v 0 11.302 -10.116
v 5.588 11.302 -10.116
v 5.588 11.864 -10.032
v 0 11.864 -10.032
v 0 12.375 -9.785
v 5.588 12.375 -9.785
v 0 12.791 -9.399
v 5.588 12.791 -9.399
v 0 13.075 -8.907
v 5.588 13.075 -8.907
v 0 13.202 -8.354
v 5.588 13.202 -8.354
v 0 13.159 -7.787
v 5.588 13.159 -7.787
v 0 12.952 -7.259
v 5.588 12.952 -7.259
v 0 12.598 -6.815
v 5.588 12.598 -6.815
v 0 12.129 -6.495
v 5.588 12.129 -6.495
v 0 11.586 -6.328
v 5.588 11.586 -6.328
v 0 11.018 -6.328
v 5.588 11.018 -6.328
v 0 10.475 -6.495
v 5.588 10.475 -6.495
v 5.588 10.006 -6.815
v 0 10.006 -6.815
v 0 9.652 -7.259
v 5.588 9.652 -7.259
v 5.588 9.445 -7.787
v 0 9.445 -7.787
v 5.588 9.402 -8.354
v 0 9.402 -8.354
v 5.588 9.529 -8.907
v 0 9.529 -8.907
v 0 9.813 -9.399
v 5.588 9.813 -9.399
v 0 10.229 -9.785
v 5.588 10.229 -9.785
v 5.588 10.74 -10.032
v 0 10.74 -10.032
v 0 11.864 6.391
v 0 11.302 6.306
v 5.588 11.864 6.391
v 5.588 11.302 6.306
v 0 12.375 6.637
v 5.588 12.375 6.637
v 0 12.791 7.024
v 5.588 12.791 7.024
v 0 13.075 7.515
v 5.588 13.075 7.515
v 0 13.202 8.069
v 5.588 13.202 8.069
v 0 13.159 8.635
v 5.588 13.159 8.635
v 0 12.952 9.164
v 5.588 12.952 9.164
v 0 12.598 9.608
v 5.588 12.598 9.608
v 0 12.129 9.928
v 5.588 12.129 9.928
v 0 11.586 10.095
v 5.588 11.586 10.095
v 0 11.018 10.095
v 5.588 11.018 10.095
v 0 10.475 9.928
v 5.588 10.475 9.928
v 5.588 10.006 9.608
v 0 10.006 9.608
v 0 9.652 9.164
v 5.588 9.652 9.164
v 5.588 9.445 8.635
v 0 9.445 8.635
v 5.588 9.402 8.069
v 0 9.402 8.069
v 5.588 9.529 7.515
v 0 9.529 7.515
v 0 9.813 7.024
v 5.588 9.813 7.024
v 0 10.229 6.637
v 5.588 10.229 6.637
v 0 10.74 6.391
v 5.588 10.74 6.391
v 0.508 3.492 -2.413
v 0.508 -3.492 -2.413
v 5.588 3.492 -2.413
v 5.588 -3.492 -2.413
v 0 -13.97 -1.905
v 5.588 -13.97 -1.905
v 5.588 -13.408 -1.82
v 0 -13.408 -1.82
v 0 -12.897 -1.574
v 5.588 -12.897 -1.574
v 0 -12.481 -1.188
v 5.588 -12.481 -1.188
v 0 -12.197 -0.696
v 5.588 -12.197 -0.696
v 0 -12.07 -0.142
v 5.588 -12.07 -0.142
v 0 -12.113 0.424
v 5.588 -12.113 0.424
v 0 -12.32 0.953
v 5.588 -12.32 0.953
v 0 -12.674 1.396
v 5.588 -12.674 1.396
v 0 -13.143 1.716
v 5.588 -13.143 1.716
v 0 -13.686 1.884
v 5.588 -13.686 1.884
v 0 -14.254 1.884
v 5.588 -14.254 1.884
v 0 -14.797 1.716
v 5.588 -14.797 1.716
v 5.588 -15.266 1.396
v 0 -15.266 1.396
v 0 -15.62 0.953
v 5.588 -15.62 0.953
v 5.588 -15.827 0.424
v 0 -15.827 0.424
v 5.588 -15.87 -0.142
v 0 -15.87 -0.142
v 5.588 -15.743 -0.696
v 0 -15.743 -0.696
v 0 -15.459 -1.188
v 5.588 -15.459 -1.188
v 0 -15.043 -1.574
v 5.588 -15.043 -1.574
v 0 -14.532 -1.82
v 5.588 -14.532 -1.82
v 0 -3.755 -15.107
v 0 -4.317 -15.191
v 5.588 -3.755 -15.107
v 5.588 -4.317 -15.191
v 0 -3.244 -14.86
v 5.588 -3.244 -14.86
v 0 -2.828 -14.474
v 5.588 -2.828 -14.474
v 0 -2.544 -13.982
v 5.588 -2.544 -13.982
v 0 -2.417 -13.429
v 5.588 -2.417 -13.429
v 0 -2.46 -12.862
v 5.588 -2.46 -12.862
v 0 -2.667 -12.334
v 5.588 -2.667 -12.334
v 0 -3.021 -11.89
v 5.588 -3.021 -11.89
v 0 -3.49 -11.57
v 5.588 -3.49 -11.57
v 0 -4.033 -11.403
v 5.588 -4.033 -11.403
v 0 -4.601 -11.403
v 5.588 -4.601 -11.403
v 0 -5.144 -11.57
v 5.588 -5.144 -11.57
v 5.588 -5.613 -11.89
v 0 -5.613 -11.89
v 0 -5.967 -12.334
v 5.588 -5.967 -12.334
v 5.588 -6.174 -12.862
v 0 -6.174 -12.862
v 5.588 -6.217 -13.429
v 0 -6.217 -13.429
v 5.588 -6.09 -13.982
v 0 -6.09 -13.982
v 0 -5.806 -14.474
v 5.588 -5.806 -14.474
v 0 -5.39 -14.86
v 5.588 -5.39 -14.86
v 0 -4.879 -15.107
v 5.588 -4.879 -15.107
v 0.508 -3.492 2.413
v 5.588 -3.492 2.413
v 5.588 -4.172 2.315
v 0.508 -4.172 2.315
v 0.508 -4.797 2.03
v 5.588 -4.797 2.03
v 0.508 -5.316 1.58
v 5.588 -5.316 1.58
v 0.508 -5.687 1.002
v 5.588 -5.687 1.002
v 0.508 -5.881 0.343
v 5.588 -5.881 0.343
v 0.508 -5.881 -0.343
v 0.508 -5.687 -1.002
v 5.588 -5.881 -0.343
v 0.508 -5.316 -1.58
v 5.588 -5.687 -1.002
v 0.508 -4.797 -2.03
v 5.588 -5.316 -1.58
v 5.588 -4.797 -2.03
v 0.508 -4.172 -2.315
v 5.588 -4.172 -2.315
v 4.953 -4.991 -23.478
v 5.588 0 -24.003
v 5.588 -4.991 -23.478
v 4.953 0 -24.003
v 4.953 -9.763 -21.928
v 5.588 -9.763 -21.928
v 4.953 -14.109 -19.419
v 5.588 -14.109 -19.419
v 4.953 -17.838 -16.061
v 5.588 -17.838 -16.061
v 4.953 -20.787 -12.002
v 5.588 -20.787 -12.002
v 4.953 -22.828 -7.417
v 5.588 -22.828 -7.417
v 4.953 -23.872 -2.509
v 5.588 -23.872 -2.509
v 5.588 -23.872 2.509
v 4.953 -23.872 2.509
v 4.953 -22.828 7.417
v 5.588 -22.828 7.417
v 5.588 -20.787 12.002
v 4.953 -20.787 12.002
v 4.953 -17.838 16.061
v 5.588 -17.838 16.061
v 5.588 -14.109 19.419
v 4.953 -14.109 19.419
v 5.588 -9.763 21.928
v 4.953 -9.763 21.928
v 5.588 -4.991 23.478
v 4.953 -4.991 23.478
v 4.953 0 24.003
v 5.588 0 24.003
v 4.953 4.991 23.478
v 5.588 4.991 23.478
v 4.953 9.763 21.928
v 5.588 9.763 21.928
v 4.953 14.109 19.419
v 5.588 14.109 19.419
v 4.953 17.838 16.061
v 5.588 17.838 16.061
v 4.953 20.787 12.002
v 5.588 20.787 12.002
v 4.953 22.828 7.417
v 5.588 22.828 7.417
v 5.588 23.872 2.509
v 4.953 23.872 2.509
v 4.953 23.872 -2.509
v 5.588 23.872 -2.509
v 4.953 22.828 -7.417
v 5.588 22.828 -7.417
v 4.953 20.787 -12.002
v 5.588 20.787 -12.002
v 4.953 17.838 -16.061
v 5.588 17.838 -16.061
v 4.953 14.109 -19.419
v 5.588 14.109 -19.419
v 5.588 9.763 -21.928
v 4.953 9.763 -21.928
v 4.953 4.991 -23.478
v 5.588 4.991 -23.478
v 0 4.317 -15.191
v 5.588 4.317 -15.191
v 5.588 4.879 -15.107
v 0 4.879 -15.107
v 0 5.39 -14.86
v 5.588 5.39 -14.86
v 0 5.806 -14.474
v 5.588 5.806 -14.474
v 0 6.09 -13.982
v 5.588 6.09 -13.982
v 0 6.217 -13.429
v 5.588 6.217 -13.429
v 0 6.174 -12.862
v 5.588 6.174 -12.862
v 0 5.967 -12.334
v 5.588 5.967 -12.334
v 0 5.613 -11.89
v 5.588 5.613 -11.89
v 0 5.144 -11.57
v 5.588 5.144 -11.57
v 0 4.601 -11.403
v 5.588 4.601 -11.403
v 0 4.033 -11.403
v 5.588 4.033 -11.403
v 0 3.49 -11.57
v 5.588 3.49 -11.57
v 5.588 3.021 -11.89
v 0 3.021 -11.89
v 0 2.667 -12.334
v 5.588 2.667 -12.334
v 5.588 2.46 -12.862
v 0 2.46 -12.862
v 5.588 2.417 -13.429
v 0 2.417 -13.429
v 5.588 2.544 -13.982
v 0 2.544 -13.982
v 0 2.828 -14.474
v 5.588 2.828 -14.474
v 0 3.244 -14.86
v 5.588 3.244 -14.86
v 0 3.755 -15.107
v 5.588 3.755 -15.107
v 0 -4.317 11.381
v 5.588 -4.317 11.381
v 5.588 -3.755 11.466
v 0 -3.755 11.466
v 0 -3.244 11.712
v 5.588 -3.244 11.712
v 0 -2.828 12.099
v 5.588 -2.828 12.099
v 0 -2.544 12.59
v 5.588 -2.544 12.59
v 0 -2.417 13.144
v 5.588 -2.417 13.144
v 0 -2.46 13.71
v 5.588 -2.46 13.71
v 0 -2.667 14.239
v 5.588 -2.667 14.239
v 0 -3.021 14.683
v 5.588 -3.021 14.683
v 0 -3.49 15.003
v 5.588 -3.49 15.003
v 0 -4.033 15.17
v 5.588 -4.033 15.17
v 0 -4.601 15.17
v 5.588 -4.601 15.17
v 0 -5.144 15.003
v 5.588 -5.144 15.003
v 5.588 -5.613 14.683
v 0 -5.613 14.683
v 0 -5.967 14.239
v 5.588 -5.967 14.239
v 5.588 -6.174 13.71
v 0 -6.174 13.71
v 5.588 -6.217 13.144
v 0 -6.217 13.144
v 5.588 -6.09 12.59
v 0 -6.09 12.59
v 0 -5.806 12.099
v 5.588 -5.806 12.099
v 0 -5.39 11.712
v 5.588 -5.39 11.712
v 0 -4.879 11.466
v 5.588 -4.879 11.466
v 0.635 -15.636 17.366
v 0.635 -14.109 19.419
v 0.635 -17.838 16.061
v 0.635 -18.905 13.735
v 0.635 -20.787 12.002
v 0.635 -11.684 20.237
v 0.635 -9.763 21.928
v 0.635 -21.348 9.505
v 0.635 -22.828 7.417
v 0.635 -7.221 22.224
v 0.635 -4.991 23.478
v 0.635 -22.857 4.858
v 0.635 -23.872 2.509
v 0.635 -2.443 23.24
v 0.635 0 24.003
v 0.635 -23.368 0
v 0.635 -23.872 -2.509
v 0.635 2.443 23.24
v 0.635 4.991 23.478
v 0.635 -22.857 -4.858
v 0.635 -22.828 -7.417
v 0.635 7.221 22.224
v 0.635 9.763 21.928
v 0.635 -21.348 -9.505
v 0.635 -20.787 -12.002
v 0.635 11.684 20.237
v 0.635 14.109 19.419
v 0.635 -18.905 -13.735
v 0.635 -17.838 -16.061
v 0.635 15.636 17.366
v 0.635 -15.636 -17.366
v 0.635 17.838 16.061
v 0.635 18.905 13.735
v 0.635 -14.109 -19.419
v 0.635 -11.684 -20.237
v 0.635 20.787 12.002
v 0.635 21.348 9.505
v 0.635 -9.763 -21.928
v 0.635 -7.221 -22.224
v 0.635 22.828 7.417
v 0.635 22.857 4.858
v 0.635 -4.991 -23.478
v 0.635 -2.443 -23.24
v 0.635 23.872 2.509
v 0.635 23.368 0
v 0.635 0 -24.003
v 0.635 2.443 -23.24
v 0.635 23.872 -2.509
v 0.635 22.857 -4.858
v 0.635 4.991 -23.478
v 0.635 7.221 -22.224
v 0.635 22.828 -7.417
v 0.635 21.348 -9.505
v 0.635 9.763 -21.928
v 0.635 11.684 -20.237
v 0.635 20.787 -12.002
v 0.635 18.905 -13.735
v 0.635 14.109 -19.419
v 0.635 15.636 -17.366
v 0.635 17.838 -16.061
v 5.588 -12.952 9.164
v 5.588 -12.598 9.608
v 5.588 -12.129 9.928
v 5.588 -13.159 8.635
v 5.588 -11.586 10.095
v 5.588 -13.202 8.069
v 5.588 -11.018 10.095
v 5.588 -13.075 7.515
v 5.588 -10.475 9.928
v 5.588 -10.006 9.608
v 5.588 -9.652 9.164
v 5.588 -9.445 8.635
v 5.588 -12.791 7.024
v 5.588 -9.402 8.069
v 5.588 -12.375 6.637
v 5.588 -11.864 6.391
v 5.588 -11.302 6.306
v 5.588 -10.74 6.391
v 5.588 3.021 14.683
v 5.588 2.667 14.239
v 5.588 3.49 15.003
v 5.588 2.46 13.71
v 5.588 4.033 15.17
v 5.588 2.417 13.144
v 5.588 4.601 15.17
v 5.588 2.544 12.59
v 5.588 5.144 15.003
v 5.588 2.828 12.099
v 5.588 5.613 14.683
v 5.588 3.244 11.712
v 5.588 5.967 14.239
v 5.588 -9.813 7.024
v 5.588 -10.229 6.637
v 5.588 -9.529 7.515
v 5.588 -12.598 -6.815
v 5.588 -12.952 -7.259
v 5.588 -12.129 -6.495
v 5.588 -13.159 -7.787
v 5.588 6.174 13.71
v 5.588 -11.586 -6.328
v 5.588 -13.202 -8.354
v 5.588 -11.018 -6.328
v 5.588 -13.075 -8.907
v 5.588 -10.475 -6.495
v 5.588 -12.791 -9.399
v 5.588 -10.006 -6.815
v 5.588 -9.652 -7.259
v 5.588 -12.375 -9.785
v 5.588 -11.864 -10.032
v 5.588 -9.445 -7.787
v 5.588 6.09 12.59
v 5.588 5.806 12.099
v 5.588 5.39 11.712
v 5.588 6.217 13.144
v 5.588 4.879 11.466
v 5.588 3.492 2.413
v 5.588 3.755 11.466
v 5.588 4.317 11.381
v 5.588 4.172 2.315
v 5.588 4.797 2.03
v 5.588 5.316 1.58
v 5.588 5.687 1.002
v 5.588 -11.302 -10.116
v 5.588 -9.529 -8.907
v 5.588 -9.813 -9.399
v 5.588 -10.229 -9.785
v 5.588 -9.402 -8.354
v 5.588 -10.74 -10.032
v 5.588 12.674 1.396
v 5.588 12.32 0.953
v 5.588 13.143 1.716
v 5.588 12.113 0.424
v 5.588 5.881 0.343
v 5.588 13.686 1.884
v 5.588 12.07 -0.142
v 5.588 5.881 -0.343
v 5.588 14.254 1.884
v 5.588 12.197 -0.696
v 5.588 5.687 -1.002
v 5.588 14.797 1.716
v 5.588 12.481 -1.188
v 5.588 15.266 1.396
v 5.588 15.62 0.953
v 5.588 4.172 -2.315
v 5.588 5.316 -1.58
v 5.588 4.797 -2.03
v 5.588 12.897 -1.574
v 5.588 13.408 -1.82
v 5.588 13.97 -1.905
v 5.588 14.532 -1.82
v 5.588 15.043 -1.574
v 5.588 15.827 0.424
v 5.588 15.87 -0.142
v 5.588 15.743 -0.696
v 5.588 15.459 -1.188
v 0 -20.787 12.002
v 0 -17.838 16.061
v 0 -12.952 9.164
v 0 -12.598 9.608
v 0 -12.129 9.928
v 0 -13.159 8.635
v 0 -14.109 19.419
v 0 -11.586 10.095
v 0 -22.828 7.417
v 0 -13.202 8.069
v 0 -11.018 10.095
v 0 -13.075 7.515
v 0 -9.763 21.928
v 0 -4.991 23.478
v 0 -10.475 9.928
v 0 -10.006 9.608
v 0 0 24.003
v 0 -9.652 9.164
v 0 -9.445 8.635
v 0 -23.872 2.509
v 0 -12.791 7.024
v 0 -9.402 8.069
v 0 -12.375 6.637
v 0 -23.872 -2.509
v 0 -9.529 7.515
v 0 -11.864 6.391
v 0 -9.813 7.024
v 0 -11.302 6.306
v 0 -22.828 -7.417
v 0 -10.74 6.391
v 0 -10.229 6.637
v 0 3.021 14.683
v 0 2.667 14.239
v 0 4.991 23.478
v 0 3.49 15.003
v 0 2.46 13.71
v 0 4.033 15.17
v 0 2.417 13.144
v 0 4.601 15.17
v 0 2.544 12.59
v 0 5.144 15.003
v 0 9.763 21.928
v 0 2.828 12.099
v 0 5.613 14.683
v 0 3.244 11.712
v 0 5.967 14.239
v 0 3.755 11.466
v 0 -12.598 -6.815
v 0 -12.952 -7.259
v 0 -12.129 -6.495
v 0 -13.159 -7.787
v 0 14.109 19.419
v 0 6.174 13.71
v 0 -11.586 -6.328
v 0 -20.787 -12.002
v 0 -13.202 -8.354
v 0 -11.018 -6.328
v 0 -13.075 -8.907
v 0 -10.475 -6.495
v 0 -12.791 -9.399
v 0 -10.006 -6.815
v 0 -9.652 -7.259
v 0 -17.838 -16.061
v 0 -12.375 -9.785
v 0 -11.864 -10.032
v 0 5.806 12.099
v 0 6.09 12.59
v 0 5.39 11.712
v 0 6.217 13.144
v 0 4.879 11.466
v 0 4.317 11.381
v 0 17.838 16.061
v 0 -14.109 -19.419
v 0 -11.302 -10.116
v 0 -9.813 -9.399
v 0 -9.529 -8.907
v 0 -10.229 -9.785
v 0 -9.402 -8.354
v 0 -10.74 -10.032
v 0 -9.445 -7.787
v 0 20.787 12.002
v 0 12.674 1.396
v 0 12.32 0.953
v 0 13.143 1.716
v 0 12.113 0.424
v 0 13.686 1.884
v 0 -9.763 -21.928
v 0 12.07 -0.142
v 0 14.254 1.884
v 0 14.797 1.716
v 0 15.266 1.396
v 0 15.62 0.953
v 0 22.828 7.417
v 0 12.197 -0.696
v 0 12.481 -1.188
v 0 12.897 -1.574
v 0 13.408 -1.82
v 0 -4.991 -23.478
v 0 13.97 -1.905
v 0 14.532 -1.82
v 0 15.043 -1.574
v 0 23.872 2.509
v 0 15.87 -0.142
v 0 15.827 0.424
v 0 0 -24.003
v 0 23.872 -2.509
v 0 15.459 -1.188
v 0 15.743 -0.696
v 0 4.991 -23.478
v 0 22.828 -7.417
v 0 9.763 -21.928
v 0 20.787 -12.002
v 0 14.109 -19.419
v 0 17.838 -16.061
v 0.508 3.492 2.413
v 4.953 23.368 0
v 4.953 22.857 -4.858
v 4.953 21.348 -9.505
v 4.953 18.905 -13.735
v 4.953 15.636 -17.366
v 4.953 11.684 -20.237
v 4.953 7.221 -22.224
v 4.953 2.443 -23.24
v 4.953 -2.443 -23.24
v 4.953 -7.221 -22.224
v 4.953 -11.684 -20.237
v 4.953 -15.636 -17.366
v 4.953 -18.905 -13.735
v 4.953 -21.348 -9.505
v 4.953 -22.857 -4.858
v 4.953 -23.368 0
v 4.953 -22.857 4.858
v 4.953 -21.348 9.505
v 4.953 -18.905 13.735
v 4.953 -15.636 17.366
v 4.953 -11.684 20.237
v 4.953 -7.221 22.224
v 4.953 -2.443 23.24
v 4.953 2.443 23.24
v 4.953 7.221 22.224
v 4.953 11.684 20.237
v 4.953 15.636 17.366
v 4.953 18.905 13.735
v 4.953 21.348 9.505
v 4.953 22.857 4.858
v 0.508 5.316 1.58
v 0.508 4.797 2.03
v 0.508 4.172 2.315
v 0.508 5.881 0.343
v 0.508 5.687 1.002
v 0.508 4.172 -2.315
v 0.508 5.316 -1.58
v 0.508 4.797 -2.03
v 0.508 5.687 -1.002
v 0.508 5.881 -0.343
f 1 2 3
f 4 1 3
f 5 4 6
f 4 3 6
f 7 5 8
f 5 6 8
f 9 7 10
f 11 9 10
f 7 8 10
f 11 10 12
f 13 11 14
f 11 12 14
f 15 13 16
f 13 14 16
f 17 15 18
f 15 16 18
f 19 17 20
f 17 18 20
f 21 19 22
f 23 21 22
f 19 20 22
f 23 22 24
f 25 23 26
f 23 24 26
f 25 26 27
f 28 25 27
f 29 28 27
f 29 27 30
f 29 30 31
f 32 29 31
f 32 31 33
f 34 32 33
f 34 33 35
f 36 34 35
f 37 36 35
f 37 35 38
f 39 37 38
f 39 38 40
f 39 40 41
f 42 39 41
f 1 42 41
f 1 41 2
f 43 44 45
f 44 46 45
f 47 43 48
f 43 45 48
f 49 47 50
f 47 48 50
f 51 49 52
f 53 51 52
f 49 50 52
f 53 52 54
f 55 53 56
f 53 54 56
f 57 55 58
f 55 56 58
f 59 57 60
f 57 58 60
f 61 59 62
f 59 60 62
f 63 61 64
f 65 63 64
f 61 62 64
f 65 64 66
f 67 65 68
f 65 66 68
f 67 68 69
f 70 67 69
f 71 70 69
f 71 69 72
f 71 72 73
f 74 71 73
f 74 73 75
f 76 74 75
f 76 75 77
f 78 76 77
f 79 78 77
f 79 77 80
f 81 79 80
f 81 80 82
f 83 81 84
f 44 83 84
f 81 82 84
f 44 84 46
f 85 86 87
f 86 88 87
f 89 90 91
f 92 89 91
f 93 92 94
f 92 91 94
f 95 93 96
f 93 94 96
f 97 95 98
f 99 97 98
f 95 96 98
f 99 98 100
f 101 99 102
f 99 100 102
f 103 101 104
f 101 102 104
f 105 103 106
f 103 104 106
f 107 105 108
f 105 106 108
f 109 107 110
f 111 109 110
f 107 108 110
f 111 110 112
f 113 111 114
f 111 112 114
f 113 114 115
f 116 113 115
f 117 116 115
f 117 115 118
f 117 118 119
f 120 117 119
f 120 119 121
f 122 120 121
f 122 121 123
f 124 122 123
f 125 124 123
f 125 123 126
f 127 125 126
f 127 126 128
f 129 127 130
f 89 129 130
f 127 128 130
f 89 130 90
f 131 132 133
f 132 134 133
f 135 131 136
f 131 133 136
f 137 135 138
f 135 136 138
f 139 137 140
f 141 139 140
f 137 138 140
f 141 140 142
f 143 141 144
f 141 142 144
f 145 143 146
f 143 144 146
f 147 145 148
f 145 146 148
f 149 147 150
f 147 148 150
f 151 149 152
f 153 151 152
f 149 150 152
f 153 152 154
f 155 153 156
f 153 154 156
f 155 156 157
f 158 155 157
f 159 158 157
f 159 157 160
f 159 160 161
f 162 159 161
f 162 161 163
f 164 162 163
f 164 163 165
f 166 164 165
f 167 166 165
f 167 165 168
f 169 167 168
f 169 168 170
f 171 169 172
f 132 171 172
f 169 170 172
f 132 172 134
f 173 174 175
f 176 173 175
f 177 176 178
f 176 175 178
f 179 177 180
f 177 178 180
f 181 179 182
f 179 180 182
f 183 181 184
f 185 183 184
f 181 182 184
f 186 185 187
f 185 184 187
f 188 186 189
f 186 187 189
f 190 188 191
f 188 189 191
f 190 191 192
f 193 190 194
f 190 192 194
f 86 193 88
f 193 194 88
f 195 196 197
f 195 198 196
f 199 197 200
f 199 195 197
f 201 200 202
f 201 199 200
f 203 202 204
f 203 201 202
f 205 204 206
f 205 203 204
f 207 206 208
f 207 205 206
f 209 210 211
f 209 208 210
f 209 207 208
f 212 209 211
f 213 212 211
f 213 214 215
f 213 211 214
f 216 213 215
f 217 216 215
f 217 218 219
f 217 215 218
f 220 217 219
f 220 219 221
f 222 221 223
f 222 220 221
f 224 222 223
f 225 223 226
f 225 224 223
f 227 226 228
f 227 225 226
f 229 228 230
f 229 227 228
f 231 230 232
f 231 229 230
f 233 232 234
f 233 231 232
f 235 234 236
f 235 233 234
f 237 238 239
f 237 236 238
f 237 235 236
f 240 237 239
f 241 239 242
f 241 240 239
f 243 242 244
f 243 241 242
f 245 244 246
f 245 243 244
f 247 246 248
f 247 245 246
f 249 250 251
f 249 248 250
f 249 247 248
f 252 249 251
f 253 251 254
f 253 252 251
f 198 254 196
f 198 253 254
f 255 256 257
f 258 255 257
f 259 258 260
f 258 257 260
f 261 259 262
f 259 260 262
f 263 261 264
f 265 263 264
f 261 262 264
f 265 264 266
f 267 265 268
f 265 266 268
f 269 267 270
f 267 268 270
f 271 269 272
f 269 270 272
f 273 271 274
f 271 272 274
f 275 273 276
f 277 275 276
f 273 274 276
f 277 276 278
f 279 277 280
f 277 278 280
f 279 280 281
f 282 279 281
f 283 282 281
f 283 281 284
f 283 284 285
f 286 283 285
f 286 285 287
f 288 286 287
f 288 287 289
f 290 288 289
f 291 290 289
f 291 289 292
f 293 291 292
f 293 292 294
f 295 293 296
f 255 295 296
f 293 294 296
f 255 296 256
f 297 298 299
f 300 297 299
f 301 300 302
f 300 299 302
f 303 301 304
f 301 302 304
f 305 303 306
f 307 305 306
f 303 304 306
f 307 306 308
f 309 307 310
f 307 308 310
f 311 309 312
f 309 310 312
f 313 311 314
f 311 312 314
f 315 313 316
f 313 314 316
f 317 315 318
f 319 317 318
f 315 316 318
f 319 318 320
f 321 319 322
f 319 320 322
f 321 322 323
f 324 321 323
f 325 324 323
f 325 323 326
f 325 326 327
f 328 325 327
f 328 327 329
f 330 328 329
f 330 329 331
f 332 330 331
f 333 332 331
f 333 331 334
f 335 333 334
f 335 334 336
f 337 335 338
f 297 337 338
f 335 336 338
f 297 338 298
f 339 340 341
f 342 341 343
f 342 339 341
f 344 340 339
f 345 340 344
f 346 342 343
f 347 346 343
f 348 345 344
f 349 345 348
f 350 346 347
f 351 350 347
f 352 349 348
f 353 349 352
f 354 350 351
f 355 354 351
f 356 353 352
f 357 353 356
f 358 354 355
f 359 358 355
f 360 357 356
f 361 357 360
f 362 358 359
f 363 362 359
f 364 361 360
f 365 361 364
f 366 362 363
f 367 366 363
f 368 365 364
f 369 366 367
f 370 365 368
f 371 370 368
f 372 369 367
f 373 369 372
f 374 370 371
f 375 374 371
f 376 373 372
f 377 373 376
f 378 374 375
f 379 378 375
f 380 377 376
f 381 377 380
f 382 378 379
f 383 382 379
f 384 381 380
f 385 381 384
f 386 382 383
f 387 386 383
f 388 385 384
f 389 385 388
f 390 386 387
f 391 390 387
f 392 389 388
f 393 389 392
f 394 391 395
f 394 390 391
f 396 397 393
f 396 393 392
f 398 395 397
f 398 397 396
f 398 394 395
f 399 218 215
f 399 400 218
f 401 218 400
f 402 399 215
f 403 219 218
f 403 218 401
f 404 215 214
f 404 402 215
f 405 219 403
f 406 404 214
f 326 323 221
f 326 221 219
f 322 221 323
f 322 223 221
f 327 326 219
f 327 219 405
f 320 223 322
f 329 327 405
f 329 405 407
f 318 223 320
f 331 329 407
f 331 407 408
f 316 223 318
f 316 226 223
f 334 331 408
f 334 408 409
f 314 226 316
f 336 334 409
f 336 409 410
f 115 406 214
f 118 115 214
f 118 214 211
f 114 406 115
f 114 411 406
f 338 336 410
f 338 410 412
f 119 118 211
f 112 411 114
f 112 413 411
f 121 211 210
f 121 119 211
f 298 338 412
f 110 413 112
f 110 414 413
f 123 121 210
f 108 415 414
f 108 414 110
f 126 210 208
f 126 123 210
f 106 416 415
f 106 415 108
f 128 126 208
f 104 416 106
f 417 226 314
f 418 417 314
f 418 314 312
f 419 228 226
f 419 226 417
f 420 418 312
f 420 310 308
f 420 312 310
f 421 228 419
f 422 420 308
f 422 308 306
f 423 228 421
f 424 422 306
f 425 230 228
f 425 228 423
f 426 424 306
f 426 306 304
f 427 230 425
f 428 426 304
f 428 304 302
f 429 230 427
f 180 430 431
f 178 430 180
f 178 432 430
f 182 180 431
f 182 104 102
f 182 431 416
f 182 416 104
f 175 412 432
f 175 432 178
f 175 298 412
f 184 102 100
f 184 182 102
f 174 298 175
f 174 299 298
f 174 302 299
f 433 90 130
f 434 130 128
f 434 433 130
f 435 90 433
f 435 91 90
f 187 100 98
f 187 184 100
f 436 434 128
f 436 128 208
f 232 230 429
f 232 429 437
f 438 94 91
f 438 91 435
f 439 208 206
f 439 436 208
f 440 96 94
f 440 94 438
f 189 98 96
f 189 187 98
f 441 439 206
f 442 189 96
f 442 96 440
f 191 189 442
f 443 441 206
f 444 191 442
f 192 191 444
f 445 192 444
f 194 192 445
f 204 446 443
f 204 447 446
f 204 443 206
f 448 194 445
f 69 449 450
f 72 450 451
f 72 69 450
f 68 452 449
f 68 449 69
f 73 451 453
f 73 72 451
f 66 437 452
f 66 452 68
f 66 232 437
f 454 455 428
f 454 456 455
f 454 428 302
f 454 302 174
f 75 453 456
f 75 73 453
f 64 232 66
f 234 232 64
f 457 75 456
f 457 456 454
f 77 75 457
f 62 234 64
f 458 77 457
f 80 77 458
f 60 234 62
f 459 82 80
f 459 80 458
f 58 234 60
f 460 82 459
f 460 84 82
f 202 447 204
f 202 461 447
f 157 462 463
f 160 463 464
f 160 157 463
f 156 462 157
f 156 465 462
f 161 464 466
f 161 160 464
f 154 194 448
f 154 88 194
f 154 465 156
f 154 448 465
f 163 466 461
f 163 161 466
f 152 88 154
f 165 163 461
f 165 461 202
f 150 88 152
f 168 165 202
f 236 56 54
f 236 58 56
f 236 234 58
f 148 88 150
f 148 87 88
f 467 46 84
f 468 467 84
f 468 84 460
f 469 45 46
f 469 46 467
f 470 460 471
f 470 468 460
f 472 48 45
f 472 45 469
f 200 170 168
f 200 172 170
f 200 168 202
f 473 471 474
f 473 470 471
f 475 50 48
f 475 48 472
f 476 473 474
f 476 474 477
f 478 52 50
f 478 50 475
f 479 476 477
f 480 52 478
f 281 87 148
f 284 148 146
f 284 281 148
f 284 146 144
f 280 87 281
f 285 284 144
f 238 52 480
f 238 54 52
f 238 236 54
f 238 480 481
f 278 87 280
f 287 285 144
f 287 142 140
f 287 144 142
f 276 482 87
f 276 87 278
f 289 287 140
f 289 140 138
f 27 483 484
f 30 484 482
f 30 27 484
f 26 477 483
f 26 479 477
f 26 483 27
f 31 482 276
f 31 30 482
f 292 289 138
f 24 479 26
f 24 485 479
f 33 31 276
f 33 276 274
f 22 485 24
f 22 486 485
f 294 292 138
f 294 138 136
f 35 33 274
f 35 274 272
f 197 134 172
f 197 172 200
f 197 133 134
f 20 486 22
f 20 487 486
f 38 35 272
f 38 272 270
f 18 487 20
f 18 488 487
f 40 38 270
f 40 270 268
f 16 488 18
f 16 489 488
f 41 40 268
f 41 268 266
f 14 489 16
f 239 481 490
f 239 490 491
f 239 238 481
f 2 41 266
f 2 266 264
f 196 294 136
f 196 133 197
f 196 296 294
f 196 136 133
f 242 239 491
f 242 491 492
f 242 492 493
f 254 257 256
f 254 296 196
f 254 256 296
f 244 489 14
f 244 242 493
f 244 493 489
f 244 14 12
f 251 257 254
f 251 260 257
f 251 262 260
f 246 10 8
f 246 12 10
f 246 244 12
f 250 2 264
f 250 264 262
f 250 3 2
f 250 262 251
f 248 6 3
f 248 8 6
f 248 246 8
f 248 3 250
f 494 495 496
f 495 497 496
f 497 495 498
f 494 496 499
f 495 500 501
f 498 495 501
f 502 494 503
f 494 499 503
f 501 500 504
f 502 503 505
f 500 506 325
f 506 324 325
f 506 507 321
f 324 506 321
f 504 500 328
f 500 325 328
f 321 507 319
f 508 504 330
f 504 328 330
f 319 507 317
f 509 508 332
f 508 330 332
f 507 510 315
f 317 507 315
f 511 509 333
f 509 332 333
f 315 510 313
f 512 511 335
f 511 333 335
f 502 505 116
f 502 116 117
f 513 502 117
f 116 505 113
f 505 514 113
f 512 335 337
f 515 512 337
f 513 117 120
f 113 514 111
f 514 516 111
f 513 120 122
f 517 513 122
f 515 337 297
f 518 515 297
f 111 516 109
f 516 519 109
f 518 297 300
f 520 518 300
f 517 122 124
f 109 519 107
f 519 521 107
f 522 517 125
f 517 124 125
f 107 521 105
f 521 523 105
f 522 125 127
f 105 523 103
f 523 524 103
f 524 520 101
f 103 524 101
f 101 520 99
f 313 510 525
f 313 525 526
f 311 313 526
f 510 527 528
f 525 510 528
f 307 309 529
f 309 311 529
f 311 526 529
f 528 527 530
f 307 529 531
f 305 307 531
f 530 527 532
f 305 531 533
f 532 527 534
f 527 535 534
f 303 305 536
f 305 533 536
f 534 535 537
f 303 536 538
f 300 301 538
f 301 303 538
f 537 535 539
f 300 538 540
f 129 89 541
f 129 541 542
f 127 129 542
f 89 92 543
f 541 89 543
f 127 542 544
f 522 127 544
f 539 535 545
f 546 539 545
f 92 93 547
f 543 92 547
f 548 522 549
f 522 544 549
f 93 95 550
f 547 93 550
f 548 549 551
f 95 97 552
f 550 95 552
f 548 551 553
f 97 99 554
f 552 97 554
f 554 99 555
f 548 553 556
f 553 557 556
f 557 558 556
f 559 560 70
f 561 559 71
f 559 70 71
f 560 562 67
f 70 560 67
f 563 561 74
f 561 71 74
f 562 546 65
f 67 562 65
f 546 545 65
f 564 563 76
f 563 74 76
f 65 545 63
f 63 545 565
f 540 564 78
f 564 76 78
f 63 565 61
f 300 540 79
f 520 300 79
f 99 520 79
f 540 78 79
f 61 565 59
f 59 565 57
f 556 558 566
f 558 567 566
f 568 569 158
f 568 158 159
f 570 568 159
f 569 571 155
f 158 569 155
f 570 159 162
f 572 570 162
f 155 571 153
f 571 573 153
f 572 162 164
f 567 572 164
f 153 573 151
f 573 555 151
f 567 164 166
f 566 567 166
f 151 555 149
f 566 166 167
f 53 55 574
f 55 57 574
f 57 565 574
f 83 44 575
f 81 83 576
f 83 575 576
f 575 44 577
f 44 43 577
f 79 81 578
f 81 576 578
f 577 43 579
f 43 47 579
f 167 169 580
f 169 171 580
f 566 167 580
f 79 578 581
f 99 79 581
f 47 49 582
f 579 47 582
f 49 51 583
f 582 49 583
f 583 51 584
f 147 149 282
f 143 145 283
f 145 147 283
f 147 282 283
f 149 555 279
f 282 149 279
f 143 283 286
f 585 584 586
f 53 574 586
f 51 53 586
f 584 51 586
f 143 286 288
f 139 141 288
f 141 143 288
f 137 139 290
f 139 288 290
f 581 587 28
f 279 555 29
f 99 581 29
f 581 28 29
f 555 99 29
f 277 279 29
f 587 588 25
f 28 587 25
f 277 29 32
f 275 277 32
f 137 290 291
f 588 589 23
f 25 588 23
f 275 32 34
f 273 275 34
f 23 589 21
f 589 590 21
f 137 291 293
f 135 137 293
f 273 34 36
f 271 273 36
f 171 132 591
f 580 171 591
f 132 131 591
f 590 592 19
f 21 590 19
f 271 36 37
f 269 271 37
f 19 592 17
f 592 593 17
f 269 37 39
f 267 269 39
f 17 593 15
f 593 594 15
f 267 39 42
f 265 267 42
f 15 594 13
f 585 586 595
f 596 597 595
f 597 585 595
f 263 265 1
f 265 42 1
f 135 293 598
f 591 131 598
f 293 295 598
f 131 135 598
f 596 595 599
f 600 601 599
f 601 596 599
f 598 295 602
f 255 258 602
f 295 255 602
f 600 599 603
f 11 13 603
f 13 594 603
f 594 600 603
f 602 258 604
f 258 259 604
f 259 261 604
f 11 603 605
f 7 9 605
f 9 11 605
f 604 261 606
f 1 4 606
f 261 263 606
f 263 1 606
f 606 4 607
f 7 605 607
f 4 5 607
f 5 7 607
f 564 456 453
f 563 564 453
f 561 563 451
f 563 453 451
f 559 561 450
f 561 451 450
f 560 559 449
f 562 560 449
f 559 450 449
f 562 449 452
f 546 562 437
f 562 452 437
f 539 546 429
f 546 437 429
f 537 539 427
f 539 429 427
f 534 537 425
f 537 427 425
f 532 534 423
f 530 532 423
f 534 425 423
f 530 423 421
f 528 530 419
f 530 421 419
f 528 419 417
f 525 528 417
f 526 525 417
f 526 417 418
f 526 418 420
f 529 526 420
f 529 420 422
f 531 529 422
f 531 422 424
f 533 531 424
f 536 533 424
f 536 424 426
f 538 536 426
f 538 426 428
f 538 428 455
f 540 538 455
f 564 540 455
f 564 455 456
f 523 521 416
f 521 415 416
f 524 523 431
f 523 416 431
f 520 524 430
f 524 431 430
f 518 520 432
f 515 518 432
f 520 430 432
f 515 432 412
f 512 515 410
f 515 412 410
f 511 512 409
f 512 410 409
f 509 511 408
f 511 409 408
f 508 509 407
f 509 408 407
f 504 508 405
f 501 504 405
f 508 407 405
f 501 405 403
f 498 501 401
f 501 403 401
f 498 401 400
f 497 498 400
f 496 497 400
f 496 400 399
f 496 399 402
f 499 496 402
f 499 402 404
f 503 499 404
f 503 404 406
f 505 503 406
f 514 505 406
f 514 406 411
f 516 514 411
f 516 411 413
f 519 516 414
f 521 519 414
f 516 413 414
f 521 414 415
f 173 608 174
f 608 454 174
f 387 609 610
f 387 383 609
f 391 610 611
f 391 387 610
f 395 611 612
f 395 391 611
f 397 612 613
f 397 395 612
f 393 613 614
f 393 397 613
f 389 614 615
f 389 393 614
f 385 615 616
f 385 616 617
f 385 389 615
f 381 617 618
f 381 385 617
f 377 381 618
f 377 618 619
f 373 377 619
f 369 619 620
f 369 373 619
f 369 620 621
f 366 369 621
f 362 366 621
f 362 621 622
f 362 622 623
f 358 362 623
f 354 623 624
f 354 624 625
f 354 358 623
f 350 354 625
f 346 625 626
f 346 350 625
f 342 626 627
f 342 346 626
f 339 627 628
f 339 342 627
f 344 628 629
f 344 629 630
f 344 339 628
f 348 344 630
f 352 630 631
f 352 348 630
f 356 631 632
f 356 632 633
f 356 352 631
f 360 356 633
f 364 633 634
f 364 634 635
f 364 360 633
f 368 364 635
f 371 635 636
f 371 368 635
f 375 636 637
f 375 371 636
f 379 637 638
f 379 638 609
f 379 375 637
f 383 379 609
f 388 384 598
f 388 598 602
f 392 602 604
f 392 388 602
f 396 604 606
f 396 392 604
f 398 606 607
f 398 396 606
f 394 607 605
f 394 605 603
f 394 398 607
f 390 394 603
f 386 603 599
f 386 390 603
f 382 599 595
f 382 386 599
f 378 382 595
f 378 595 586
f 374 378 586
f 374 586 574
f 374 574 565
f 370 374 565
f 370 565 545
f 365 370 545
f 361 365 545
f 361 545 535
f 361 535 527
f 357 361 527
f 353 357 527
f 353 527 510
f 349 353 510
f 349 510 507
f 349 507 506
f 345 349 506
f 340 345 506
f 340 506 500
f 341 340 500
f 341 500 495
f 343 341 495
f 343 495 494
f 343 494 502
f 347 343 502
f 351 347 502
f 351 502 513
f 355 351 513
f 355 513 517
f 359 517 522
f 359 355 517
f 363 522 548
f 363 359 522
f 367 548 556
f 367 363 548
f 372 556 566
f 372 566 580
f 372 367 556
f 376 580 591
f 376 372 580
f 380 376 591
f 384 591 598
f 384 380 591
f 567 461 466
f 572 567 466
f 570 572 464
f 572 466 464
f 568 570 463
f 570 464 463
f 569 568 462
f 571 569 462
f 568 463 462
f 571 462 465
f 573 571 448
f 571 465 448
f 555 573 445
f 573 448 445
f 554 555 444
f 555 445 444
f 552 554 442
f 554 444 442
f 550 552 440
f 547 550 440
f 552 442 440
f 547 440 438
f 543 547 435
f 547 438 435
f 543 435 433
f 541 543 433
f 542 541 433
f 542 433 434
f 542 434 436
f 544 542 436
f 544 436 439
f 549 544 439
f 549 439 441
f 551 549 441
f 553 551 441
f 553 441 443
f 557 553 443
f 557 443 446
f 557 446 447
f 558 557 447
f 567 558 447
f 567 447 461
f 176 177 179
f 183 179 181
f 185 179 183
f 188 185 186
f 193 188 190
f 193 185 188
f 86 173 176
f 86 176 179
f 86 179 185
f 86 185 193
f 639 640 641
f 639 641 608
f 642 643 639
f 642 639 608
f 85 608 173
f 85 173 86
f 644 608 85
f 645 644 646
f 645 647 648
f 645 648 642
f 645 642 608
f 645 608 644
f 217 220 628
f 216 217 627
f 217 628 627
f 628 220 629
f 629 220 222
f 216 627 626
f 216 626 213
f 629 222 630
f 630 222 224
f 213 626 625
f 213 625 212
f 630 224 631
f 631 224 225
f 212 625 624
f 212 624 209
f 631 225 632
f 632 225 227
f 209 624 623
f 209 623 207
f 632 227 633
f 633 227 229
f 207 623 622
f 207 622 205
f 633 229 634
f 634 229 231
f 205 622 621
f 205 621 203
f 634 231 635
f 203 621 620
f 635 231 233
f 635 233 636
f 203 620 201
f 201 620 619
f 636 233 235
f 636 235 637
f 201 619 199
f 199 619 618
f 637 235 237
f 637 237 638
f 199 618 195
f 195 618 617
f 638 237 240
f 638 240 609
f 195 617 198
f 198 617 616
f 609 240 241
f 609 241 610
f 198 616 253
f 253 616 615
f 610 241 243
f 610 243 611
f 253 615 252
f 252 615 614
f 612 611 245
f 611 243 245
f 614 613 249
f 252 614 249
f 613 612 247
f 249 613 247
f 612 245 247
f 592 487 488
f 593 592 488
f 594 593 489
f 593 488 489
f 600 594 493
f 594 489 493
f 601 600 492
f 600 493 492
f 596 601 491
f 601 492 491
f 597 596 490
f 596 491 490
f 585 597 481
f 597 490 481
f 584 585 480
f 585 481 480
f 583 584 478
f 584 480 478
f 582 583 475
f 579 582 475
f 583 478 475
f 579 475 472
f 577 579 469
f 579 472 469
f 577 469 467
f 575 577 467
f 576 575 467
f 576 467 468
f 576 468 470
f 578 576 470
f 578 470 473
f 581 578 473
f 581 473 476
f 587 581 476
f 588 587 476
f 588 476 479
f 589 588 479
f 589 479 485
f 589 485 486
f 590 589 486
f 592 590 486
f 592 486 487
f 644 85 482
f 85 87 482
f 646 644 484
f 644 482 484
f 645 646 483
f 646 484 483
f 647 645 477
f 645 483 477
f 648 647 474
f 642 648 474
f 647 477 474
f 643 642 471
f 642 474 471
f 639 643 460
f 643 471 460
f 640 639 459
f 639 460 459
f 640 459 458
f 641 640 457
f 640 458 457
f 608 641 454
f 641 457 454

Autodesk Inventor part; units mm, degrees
sketch "Sketch1" plane through (0, 0, 0) normal (1, 0, 0) x (0, 1, 0)
  circle A0 centre (0, 0) radius 23.368
  dimension "d0" = 46.736
extrude "Extrusion1" add sketch "Sketch1" along normal blind 5.588
ref_plane "Work Plane2" through (5.588, 0, 0) normal (1, 0, 0) x (0, 0, -1)
sketch "Sketch3" plane through (5.588, 0, 0) normal (1, 0, 0) x (0, 0, -1)
  line L0 (0, -3.4925) -> (0, 3.4925) construction
  line L1 (2.413, -3.4925) -> (2.413, 3.4925)
  line L2 (-2.413, 3.4925) -> (-2.413, -3.4925)
  arc A0 (-2.413, -3.4925) -> (2.413, -3.4925) centre (0, -3.4925) ccw
  arc A1 (2.413, 3.4925) -> (-2.413, 3.4925) centre (0, 3.4925) ccw
  point P0 (0, 0)
  dimension "d8" = 3.4925
  dimension "d9" = 4.826
extrude "Extrusion2" cut sketch "Sketch3" against normal blind 5.08
ref_plane "Work Plane3" through (5.588, 0, 0) normal (1, 0, 0) x (0, 0, -1)
sketch "Sketch6" plane through (5.588, 0, 0) normal (1, 0, 0) x (0, 0, -1)
  line L0 (0, 0) -> (0, 13.97)
  circle A0 centre (0, 13.97) radius 1.905
  circle A1 centre (-8.2114, 11.302) radius 1.905
  circle A2 centre (-13.2863, 4.317) radius 1.905
  circle A3 centre (-13.2863, -4.317) radius 1.905
  circle A4 centre (-8.2114, -11.302) radius 1.905
  circle A5 centre (0, -13.97) radius 1.905
  circle A6 centre (8.2114, -11.302) radius 1.905
  circle A7 centre (13.2863, -4.317) radius 1.905
  circle A8 centre (13.2863, 4.317) radius 1.905
  circle A9 centre (8.2114, 11.302) radius 1.905
  dimension "d16" = 13.97
  dimension "d17" = 3.81
  dimension "d20" = 360
extrude "Extrusion3" cut sketch "Sketch6" against normal blind 25.4
ref_plane "Work Plane1" through (5.588, 0, 0) normal (1, 0, 0) x (0, 0, -1)
sketch "Sketch7" plane through (5.588, 0, 0) normal (1, 0, 0) x (0, 0, -1)
  line L0 (0, 0) -> (0, -23.749) construction
  circle A0 centre (0, 0) radius 23.749 projected
  dimension "d24" = 23.749
sketch "Sketch8" plane through (0, 0, 0) normal (0, 1, 0) x (-1, 0, 0)
  line L0 (0, -23.368) -> (0, 23.368) projected
  line L1 (0, -23.368) -> (0, -24.003)
  line L2 (0, -24.003) -> (-0.635, -24.003)
  line L3 (-0.635, -24.003) -> (-0.635, -23.368)
  line L4 (-0.635, -23.368) -> (0, -23.368)
  line L5 (0, -23.368) -> (-5.588, -23.368) projected
  line L6 (-0.635, -23.368) -> (0, -23.368)
  line L7 (-5.588, -23.368) -> (-5.588, -24.003)
  line L8 (-5.588, -24.003) -> (-4.953, -24.003)
  line L9 (-4.953, -24.003) -> (-4.953, -23.368)
  line L10 (-4.953, -23.368) -> (-5.588, -23.368)
  line L11 (0, 0) -> (-5.8379, 0)
  dimension "d25" = 0.635
  dimension "d26" = 0.635
  dimension "d27" = 0.635
  dimension "d28" = 0.635
revolve "Revolution2" add sketch "Sketch8" angle 360 about axis through (0, 0, 0) along (1, 0, 0)
properties part number "msheehan_wheel_small"
